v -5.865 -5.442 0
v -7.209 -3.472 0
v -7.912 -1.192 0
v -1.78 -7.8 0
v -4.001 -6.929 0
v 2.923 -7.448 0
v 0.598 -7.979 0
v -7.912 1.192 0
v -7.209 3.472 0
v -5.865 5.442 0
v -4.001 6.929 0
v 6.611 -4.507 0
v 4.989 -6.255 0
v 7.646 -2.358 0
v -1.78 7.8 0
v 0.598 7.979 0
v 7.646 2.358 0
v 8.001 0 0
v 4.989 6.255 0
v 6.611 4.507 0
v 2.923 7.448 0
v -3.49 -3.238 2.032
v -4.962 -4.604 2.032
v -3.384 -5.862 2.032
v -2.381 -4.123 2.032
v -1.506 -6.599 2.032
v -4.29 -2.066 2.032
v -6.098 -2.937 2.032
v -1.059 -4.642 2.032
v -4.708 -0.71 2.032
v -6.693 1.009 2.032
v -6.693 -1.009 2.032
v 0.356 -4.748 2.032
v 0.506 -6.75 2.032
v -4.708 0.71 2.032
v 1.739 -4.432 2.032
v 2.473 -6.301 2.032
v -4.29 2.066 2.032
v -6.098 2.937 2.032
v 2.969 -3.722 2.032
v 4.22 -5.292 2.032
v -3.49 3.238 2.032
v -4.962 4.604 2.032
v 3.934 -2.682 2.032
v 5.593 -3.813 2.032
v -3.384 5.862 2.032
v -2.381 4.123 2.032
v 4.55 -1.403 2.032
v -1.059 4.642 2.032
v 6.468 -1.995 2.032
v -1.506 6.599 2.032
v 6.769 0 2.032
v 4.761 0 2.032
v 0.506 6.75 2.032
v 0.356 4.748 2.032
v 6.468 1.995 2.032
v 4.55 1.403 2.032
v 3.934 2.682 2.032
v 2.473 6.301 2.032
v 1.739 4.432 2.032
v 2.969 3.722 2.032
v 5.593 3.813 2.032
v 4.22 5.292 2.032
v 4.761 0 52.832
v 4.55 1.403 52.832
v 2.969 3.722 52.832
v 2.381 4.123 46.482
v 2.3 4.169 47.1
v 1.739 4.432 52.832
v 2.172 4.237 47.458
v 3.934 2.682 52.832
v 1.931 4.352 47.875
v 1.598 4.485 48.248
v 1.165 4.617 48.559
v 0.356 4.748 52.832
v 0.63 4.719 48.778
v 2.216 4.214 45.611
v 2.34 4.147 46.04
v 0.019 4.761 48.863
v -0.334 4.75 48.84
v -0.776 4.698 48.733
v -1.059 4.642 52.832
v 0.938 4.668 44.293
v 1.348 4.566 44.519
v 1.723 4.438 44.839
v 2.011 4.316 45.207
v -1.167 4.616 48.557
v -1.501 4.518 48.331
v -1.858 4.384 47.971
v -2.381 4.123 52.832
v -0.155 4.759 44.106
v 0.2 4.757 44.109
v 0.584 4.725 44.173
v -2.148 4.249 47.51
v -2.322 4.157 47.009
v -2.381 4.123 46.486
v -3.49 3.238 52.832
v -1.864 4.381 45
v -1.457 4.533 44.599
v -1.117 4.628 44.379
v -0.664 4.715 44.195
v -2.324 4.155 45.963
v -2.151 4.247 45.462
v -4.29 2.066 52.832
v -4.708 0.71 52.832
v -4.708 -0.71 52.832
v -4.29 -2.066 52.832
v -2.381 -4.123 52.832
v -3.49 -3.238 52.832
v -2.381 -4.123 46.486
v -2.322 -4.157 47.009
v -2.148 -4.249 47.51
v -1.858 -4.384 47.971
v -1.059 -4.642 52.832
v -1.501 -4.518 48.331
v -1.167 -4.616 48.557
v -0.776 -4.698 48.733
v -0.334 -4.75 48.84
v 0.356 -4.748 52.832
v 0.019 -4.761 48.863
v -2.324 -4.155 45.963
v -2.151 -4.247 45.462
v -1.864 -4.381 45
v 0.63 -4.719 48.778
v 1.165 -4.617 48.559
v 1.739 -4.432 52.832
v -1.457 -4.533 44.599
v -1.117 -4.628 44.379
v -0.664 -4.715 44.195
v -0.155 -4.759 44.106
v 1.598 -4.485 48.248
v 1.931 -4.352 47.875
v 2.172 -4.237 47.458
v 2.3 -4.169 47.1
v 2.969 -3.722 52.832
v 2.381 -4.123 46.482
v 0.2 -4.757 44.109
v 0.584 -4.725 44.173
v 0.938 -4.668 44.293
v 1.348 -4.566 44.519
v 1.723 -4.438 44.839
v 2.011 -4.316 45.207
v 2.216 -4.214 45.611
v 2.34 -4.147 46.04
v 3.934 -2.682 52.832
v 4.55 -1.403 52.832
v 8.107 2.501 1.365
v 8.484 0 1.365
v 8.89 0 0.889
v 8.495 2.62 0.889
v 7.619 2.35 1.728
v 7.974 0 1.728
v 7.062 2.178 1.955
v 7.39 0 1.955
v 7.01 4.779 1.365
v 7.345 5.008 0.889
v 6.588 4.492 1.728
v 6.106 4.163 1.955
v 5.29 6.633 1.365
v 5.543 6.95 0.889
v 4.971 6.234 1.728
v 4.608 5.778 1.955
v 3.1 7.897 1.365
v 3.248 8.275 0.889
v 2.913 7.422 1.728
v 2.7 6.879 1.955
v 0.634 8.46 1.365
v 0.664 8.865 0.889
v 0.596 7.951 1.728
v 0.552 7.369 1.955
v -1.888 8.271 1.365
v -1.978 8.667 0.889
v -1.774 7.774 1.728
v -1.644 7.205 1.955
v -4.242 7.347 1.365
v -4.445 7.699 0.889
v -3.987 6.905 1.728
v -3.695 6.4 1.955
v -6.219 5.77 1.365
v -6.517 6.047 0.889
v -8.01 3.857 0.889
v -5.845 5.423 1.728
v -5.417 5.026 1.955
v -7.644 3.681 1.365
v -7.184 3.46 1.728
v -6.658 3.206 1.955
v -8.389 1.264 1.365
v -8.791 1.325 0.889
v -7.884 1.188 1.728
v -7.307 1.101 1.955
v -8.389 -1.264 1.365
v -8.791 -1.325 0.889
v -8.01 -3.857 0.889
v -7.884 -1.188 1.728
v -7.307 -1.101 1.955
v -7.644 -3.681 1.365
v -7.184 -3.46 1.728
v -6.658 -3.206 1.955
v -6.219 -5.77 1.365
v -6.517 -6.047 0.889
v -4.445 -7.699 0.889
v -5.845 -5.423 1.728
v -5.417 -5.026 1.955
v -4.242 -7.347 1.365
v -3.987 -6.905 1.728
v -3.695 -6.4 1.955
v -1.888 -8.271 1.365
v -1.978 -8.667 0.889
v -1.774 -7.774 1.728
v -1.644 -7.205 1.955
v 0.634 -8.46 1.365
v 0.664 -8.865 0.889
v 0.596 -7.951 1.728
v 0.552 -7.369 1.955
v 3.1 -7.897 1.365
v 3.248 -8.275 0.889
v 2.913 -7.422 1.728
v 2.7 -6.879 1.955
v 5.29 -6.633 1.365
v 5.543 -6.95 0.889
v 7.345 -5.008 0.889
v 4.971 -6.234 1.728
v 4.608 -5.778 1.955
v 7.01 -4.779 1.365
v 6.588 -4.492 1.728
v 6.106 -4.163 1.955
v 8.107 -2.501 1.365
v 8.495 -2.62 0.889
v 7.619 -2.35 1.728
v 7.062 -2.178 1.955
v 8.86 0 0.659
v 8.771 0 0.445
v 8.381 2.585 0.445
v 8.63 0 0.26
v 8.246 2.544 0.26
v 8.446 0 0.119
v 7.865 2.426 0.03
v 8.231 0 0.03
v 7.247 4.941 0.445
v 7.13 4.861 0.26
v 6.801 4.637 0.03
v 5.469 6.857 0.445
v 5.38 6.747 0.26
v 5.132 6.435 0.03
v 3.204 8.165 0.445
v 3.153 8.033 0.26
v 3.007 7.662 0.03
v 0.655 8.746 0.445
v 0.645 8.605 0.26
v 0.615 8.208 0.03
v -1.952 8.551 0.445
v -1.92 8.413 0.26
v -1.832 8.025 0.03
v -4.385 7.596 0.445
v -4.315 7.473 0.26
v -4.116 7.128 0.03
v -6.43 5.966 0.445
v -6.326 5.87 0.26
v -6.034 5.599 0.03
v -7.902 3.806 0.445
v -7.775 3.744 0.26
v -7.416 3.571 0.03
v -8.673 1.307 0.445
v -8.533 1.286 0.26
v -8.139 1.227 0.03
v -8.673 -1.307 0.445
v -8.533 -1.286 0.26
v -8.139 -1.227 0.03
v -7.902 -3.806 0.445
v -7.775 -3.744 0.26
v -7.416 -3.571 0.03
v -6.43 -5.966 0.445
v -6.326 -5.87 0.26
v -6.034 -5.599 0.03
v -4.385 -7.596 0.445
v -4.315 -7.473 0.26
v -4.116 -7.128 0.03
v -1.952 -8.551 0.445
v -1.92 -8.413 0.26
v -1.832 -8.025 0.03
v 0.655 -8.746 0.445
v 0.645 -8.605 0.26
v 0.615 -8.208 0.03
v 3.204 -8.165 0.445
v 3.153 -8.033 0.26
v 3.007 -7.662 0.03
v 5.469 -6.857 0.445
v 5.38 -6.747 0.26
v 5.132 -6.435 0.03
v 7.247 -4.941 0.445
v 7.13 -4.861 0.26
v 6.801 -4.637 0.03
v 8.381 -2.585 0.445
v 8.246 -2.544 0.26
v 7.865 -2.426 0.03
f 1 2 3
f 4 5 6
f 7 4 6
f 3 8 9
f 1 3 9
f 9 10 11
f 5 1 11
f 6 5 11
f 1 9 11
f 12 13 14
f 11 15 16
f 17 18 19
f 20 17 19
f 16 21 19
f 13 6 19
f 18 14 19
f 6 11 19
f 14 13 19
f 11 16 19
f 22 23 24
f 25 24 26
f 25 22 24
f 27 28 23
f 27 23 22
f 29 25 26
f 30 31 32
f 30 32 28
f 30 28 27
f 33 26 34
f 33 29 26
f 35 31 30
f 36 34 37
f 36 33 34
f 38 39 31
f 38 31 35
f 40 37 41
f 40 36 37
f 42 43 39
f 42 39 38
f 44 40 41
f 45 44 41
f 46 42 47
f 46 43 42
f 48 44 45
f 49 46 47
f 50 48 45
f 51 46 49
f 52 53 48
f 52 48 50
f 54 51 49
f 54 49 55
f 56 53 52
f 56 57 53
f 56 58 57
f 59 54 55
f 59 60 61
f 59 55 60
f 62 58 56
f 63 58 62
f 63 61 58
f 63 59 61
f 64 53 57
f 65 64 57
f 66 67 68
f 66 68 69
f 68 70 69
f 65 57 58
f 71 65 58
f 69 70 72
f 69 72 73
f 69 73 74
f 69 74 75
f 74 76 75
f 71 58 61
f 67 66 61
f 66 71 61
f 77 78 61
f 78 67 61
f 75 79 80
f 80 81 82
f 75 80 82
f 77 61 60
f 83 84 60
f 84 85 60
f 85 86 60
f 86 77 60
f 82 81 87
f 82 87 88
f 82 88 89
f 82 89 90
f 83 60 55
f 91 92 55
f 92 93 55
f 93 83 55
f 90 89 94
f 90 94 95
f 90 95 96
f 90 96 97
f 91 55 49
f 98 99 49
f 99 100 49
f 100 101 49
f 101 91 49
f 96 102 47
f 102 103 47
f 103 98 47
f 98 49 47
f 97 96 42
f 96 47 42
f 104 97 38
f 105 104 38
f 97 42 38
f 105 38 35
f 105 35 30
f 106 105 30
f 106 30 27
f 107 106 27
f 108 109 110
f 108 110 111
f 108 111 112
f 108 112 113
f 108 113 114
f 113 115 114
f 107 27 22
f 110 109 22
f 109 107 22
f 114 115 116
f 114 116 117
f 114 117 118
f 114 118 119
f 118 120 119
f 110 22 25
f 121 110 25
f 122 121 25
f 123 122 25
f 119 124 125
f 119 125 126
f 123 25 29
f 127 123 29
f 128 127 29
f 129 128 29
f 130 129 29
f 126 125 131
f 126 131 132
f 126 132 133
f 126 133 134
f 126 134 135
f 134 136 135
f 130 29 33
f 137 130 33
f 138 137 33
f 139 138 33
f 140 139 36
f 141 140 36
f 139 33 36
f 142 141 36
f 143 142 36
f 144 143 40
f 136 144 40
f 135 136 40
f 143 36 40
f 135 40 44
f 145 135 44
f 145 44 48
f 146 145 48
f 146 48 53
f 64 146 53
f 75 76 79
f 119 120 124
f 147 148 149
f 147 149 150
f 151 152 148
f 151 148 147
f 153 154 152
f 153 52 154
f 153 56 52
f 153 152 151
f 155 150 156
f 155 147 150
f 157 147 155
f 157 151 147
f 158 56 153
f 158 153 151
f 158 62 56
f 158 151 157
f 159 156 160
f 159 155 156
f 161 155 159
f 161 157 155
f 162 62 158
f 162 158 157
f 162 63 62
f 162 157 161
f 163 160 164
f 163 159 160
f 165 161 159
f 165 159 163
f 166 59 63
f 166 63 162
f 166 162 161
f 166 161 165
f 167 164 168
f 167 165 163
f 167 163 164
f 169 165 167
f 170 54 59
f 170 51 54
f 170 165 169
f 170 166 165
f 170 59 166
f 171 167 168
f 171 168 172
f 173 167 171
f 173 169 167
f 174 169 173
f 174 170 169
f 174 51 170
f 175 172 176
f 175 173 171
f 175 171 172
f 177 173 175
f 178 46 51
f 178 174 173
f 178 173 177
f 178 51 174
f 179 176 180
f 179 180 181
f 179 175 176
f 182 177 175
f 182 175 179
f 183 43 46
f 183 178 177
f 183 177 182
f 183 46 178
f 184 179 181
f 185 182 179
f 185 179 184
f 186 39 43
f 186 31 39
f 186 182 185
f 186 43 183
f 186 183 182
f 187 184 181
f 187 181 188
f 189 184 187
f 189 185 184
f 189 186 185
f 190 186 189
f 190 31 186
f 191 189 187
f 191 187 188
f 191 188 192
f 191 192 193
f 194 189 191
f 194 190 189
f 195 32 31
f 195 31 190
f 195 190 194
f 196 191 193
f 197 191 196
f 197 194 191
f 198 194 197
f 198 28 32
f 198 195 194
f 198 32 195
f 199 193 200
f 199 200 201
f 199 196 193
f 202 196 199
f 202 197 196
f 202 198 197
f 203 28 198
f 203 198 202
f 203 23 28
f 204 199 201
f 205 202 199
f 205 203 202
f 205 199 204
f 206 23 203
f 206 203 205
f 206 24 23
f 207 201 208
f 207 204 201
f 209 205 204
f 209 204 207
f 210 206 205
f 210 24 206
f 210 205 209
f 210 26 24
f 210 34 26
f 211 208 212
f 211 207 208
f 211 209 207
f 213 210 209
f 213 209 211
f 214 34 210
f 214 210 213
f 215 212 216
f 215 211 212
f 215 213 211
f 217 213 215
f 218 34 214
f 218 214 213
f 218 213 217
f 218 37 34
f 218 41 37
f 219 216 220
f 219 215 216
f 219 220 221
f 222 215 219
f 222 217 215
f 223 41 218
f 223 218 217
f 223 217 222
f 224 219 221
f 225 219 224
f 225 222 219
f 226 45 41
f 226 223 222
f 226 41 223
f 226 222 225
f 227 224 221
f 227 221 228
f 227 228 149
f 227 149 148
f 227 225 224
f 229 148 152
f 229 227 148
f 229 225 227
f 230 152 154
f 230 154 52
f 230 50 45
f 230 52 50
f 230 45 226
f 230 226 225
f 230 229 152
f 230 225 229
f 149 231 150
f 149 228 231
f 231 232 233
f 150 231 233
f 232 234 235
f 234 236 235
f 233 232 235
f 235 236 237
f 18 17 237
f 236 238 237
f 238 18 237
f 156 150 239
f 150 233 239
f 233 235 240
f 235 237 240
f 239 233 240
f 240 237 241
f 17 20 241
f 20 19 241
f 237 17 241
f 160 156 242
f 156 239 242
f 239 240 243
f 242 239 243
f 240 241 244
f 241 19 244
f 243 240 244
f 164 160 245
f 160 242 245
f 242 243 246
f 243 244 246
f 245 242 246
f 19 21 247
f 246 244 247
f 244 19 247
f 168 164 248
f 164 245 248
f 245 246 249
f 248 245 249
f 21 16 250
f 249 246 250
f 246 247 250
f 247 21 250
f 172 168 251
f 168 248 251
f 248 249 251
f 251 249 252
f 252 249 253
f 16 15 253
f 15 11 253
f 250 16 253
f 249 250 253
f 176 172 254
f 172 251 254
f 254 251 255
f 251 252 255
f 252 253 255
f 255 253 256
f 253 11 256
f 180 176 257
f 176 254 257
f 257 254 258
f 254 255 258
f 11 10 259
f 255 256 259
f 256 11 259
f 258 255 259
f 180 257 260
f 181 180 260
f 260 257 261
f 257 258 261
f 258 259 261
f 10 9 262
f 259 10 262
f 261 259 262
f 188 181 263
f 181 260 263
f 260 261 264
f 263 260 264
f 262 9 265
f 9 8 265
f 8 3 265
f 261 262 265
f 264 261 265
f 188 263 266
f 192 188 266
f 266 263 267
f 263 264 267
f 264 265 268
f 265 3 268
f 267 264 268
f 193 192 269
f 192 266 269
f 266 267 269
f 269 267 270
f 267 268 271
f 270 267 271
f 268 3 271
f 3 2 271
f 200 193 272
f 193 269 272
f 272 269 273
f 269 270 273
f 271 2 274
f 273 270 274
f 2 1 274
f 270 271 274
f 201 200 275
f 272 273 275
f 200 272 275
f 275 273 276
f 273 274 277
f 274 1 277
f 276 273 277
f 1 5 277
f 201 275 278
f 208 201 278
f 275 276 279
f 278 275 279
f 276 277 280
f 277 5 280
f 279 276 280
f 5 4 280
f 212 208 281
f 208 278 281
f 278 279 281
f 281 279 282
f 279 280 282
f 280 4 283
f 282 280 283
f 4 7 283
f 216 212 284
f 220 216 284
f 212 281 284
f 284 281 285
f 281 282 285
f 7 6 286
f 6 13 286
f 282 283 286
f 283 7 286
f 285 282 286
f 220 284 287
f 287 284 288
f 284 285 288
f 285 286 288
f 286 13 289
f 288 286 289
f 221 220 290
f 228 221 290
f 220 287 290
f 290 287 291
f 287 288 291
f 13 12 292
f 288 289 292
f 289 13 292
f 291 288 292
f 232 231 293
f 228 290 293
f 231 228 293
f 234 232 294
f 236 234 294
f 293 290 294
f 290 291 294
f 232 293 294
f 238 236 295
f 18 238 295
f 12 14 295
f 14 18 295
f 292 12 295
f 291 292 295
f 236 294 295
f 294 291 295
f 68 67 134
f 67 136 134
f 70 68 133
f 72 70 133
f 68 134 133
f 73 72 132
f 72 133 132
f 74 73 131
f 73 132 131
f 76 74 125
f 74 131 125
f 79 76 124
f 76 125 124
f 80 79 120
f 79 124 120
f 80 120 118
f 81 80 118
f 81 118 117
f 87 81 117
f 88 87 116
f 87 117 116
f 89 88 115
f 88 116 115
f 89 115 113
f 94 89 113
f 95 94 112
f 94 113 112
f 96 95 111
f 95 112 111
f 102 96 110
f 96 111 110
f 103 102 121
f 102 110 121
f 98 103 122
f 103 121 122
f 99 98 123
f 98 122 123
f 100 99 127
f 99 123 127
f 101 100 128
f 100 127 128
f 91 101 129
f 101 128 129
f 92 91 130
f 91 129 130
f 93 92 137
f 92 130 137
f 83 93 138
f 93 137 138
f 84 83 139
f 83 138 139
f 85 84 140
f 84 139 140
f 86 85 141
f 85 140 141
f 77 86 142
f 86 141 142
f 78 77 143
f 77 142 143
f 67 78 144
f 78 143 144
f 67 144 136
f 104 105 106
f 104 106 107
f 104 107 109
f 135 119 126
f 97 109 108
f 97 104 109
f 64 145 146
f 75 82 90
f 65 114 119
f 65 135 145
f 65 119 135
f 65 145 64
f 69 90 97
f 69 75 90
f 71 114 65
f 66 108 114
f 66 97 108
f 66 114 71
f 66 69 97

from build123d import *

# Parameters (mm, degrees)
F0_R     = 8.89
F1_DEPTH = 2.032
F2_R     = 4.76123
F3_DEPTH = 50.8
F5_DEPTH = 4.7625
F6_R     = 0.889


# Not quite as in the source:
# - a fillet or chamfer that OpenCascade refuses, or shapes differently, is made with other operations: its cross-section is extruded or revolved along the edge and cut away or added


with BuildPart() as f1:
    # F0 (on Top) → F1 (new body)
    with BuildSketch(Plane.XY):
        Circle(F0_R)
    extrude(amount=F1_DEPTH)

    # F2 (on face) → F3 (join)
    with BuildSketch(Plane.XY.offset(2.032)):
        Circle(F2_R)
    extrude(amount=F3_DEPTH)

    # F4 (on Front) → F5 (cut, symmetric)
    with BuildSketch(Plane.XZ):
        with BuildLine():
            ThreePointArc((0, 48.86325), (-1.6837980227, 44.7982019773), (2.38125, 46.482))
            ThreePointArc((2.38125, 46.482), (1.6837980227, 48.1657980227), (0, 48.86325))
        make_face()
    extrude(amount=F5_DEPTH, both=True, mode=Mode.SUBTRACT)

    # F6
    f6_edges = [f1.edges().sort_by_distance(p)[0] for p in [
        (-8.89, 0, 0),
    ]]
    fillet(f6_edges, radius=F6_R)

    # F7: fillet of radius 2.54 on 1 edges, made by hand

    # F7_s1 → F7_t2 (revolve, cut)
    with BuildSketch(Plane.XZ):
        with BuildLine():
            ThreePointArc((8.89, 0.889), (7.9735095663, 1.7280657414), (6.7686817778, 2.032))
            Line((6.7686817778, 2.032), (6.7686817778, 2.0828))
            Line((6.7686817778, 2.0828), (8.89, 2.0828))
            Line((8.89, 2.0828), (8.9408, 2.032))
            ThreePointArc((8.9408, 2.032), (8.9408, 1.4605), (8.9324263644, 0.91694))
            Line((8.9324263644, 0.91694), (8.89, 0.889))
        make_face()
    revolve(axis=Axis((0, 0, 2.032), (0, 0, 1)), mode=Mode.SUBTRACT)


solid = f1.part
